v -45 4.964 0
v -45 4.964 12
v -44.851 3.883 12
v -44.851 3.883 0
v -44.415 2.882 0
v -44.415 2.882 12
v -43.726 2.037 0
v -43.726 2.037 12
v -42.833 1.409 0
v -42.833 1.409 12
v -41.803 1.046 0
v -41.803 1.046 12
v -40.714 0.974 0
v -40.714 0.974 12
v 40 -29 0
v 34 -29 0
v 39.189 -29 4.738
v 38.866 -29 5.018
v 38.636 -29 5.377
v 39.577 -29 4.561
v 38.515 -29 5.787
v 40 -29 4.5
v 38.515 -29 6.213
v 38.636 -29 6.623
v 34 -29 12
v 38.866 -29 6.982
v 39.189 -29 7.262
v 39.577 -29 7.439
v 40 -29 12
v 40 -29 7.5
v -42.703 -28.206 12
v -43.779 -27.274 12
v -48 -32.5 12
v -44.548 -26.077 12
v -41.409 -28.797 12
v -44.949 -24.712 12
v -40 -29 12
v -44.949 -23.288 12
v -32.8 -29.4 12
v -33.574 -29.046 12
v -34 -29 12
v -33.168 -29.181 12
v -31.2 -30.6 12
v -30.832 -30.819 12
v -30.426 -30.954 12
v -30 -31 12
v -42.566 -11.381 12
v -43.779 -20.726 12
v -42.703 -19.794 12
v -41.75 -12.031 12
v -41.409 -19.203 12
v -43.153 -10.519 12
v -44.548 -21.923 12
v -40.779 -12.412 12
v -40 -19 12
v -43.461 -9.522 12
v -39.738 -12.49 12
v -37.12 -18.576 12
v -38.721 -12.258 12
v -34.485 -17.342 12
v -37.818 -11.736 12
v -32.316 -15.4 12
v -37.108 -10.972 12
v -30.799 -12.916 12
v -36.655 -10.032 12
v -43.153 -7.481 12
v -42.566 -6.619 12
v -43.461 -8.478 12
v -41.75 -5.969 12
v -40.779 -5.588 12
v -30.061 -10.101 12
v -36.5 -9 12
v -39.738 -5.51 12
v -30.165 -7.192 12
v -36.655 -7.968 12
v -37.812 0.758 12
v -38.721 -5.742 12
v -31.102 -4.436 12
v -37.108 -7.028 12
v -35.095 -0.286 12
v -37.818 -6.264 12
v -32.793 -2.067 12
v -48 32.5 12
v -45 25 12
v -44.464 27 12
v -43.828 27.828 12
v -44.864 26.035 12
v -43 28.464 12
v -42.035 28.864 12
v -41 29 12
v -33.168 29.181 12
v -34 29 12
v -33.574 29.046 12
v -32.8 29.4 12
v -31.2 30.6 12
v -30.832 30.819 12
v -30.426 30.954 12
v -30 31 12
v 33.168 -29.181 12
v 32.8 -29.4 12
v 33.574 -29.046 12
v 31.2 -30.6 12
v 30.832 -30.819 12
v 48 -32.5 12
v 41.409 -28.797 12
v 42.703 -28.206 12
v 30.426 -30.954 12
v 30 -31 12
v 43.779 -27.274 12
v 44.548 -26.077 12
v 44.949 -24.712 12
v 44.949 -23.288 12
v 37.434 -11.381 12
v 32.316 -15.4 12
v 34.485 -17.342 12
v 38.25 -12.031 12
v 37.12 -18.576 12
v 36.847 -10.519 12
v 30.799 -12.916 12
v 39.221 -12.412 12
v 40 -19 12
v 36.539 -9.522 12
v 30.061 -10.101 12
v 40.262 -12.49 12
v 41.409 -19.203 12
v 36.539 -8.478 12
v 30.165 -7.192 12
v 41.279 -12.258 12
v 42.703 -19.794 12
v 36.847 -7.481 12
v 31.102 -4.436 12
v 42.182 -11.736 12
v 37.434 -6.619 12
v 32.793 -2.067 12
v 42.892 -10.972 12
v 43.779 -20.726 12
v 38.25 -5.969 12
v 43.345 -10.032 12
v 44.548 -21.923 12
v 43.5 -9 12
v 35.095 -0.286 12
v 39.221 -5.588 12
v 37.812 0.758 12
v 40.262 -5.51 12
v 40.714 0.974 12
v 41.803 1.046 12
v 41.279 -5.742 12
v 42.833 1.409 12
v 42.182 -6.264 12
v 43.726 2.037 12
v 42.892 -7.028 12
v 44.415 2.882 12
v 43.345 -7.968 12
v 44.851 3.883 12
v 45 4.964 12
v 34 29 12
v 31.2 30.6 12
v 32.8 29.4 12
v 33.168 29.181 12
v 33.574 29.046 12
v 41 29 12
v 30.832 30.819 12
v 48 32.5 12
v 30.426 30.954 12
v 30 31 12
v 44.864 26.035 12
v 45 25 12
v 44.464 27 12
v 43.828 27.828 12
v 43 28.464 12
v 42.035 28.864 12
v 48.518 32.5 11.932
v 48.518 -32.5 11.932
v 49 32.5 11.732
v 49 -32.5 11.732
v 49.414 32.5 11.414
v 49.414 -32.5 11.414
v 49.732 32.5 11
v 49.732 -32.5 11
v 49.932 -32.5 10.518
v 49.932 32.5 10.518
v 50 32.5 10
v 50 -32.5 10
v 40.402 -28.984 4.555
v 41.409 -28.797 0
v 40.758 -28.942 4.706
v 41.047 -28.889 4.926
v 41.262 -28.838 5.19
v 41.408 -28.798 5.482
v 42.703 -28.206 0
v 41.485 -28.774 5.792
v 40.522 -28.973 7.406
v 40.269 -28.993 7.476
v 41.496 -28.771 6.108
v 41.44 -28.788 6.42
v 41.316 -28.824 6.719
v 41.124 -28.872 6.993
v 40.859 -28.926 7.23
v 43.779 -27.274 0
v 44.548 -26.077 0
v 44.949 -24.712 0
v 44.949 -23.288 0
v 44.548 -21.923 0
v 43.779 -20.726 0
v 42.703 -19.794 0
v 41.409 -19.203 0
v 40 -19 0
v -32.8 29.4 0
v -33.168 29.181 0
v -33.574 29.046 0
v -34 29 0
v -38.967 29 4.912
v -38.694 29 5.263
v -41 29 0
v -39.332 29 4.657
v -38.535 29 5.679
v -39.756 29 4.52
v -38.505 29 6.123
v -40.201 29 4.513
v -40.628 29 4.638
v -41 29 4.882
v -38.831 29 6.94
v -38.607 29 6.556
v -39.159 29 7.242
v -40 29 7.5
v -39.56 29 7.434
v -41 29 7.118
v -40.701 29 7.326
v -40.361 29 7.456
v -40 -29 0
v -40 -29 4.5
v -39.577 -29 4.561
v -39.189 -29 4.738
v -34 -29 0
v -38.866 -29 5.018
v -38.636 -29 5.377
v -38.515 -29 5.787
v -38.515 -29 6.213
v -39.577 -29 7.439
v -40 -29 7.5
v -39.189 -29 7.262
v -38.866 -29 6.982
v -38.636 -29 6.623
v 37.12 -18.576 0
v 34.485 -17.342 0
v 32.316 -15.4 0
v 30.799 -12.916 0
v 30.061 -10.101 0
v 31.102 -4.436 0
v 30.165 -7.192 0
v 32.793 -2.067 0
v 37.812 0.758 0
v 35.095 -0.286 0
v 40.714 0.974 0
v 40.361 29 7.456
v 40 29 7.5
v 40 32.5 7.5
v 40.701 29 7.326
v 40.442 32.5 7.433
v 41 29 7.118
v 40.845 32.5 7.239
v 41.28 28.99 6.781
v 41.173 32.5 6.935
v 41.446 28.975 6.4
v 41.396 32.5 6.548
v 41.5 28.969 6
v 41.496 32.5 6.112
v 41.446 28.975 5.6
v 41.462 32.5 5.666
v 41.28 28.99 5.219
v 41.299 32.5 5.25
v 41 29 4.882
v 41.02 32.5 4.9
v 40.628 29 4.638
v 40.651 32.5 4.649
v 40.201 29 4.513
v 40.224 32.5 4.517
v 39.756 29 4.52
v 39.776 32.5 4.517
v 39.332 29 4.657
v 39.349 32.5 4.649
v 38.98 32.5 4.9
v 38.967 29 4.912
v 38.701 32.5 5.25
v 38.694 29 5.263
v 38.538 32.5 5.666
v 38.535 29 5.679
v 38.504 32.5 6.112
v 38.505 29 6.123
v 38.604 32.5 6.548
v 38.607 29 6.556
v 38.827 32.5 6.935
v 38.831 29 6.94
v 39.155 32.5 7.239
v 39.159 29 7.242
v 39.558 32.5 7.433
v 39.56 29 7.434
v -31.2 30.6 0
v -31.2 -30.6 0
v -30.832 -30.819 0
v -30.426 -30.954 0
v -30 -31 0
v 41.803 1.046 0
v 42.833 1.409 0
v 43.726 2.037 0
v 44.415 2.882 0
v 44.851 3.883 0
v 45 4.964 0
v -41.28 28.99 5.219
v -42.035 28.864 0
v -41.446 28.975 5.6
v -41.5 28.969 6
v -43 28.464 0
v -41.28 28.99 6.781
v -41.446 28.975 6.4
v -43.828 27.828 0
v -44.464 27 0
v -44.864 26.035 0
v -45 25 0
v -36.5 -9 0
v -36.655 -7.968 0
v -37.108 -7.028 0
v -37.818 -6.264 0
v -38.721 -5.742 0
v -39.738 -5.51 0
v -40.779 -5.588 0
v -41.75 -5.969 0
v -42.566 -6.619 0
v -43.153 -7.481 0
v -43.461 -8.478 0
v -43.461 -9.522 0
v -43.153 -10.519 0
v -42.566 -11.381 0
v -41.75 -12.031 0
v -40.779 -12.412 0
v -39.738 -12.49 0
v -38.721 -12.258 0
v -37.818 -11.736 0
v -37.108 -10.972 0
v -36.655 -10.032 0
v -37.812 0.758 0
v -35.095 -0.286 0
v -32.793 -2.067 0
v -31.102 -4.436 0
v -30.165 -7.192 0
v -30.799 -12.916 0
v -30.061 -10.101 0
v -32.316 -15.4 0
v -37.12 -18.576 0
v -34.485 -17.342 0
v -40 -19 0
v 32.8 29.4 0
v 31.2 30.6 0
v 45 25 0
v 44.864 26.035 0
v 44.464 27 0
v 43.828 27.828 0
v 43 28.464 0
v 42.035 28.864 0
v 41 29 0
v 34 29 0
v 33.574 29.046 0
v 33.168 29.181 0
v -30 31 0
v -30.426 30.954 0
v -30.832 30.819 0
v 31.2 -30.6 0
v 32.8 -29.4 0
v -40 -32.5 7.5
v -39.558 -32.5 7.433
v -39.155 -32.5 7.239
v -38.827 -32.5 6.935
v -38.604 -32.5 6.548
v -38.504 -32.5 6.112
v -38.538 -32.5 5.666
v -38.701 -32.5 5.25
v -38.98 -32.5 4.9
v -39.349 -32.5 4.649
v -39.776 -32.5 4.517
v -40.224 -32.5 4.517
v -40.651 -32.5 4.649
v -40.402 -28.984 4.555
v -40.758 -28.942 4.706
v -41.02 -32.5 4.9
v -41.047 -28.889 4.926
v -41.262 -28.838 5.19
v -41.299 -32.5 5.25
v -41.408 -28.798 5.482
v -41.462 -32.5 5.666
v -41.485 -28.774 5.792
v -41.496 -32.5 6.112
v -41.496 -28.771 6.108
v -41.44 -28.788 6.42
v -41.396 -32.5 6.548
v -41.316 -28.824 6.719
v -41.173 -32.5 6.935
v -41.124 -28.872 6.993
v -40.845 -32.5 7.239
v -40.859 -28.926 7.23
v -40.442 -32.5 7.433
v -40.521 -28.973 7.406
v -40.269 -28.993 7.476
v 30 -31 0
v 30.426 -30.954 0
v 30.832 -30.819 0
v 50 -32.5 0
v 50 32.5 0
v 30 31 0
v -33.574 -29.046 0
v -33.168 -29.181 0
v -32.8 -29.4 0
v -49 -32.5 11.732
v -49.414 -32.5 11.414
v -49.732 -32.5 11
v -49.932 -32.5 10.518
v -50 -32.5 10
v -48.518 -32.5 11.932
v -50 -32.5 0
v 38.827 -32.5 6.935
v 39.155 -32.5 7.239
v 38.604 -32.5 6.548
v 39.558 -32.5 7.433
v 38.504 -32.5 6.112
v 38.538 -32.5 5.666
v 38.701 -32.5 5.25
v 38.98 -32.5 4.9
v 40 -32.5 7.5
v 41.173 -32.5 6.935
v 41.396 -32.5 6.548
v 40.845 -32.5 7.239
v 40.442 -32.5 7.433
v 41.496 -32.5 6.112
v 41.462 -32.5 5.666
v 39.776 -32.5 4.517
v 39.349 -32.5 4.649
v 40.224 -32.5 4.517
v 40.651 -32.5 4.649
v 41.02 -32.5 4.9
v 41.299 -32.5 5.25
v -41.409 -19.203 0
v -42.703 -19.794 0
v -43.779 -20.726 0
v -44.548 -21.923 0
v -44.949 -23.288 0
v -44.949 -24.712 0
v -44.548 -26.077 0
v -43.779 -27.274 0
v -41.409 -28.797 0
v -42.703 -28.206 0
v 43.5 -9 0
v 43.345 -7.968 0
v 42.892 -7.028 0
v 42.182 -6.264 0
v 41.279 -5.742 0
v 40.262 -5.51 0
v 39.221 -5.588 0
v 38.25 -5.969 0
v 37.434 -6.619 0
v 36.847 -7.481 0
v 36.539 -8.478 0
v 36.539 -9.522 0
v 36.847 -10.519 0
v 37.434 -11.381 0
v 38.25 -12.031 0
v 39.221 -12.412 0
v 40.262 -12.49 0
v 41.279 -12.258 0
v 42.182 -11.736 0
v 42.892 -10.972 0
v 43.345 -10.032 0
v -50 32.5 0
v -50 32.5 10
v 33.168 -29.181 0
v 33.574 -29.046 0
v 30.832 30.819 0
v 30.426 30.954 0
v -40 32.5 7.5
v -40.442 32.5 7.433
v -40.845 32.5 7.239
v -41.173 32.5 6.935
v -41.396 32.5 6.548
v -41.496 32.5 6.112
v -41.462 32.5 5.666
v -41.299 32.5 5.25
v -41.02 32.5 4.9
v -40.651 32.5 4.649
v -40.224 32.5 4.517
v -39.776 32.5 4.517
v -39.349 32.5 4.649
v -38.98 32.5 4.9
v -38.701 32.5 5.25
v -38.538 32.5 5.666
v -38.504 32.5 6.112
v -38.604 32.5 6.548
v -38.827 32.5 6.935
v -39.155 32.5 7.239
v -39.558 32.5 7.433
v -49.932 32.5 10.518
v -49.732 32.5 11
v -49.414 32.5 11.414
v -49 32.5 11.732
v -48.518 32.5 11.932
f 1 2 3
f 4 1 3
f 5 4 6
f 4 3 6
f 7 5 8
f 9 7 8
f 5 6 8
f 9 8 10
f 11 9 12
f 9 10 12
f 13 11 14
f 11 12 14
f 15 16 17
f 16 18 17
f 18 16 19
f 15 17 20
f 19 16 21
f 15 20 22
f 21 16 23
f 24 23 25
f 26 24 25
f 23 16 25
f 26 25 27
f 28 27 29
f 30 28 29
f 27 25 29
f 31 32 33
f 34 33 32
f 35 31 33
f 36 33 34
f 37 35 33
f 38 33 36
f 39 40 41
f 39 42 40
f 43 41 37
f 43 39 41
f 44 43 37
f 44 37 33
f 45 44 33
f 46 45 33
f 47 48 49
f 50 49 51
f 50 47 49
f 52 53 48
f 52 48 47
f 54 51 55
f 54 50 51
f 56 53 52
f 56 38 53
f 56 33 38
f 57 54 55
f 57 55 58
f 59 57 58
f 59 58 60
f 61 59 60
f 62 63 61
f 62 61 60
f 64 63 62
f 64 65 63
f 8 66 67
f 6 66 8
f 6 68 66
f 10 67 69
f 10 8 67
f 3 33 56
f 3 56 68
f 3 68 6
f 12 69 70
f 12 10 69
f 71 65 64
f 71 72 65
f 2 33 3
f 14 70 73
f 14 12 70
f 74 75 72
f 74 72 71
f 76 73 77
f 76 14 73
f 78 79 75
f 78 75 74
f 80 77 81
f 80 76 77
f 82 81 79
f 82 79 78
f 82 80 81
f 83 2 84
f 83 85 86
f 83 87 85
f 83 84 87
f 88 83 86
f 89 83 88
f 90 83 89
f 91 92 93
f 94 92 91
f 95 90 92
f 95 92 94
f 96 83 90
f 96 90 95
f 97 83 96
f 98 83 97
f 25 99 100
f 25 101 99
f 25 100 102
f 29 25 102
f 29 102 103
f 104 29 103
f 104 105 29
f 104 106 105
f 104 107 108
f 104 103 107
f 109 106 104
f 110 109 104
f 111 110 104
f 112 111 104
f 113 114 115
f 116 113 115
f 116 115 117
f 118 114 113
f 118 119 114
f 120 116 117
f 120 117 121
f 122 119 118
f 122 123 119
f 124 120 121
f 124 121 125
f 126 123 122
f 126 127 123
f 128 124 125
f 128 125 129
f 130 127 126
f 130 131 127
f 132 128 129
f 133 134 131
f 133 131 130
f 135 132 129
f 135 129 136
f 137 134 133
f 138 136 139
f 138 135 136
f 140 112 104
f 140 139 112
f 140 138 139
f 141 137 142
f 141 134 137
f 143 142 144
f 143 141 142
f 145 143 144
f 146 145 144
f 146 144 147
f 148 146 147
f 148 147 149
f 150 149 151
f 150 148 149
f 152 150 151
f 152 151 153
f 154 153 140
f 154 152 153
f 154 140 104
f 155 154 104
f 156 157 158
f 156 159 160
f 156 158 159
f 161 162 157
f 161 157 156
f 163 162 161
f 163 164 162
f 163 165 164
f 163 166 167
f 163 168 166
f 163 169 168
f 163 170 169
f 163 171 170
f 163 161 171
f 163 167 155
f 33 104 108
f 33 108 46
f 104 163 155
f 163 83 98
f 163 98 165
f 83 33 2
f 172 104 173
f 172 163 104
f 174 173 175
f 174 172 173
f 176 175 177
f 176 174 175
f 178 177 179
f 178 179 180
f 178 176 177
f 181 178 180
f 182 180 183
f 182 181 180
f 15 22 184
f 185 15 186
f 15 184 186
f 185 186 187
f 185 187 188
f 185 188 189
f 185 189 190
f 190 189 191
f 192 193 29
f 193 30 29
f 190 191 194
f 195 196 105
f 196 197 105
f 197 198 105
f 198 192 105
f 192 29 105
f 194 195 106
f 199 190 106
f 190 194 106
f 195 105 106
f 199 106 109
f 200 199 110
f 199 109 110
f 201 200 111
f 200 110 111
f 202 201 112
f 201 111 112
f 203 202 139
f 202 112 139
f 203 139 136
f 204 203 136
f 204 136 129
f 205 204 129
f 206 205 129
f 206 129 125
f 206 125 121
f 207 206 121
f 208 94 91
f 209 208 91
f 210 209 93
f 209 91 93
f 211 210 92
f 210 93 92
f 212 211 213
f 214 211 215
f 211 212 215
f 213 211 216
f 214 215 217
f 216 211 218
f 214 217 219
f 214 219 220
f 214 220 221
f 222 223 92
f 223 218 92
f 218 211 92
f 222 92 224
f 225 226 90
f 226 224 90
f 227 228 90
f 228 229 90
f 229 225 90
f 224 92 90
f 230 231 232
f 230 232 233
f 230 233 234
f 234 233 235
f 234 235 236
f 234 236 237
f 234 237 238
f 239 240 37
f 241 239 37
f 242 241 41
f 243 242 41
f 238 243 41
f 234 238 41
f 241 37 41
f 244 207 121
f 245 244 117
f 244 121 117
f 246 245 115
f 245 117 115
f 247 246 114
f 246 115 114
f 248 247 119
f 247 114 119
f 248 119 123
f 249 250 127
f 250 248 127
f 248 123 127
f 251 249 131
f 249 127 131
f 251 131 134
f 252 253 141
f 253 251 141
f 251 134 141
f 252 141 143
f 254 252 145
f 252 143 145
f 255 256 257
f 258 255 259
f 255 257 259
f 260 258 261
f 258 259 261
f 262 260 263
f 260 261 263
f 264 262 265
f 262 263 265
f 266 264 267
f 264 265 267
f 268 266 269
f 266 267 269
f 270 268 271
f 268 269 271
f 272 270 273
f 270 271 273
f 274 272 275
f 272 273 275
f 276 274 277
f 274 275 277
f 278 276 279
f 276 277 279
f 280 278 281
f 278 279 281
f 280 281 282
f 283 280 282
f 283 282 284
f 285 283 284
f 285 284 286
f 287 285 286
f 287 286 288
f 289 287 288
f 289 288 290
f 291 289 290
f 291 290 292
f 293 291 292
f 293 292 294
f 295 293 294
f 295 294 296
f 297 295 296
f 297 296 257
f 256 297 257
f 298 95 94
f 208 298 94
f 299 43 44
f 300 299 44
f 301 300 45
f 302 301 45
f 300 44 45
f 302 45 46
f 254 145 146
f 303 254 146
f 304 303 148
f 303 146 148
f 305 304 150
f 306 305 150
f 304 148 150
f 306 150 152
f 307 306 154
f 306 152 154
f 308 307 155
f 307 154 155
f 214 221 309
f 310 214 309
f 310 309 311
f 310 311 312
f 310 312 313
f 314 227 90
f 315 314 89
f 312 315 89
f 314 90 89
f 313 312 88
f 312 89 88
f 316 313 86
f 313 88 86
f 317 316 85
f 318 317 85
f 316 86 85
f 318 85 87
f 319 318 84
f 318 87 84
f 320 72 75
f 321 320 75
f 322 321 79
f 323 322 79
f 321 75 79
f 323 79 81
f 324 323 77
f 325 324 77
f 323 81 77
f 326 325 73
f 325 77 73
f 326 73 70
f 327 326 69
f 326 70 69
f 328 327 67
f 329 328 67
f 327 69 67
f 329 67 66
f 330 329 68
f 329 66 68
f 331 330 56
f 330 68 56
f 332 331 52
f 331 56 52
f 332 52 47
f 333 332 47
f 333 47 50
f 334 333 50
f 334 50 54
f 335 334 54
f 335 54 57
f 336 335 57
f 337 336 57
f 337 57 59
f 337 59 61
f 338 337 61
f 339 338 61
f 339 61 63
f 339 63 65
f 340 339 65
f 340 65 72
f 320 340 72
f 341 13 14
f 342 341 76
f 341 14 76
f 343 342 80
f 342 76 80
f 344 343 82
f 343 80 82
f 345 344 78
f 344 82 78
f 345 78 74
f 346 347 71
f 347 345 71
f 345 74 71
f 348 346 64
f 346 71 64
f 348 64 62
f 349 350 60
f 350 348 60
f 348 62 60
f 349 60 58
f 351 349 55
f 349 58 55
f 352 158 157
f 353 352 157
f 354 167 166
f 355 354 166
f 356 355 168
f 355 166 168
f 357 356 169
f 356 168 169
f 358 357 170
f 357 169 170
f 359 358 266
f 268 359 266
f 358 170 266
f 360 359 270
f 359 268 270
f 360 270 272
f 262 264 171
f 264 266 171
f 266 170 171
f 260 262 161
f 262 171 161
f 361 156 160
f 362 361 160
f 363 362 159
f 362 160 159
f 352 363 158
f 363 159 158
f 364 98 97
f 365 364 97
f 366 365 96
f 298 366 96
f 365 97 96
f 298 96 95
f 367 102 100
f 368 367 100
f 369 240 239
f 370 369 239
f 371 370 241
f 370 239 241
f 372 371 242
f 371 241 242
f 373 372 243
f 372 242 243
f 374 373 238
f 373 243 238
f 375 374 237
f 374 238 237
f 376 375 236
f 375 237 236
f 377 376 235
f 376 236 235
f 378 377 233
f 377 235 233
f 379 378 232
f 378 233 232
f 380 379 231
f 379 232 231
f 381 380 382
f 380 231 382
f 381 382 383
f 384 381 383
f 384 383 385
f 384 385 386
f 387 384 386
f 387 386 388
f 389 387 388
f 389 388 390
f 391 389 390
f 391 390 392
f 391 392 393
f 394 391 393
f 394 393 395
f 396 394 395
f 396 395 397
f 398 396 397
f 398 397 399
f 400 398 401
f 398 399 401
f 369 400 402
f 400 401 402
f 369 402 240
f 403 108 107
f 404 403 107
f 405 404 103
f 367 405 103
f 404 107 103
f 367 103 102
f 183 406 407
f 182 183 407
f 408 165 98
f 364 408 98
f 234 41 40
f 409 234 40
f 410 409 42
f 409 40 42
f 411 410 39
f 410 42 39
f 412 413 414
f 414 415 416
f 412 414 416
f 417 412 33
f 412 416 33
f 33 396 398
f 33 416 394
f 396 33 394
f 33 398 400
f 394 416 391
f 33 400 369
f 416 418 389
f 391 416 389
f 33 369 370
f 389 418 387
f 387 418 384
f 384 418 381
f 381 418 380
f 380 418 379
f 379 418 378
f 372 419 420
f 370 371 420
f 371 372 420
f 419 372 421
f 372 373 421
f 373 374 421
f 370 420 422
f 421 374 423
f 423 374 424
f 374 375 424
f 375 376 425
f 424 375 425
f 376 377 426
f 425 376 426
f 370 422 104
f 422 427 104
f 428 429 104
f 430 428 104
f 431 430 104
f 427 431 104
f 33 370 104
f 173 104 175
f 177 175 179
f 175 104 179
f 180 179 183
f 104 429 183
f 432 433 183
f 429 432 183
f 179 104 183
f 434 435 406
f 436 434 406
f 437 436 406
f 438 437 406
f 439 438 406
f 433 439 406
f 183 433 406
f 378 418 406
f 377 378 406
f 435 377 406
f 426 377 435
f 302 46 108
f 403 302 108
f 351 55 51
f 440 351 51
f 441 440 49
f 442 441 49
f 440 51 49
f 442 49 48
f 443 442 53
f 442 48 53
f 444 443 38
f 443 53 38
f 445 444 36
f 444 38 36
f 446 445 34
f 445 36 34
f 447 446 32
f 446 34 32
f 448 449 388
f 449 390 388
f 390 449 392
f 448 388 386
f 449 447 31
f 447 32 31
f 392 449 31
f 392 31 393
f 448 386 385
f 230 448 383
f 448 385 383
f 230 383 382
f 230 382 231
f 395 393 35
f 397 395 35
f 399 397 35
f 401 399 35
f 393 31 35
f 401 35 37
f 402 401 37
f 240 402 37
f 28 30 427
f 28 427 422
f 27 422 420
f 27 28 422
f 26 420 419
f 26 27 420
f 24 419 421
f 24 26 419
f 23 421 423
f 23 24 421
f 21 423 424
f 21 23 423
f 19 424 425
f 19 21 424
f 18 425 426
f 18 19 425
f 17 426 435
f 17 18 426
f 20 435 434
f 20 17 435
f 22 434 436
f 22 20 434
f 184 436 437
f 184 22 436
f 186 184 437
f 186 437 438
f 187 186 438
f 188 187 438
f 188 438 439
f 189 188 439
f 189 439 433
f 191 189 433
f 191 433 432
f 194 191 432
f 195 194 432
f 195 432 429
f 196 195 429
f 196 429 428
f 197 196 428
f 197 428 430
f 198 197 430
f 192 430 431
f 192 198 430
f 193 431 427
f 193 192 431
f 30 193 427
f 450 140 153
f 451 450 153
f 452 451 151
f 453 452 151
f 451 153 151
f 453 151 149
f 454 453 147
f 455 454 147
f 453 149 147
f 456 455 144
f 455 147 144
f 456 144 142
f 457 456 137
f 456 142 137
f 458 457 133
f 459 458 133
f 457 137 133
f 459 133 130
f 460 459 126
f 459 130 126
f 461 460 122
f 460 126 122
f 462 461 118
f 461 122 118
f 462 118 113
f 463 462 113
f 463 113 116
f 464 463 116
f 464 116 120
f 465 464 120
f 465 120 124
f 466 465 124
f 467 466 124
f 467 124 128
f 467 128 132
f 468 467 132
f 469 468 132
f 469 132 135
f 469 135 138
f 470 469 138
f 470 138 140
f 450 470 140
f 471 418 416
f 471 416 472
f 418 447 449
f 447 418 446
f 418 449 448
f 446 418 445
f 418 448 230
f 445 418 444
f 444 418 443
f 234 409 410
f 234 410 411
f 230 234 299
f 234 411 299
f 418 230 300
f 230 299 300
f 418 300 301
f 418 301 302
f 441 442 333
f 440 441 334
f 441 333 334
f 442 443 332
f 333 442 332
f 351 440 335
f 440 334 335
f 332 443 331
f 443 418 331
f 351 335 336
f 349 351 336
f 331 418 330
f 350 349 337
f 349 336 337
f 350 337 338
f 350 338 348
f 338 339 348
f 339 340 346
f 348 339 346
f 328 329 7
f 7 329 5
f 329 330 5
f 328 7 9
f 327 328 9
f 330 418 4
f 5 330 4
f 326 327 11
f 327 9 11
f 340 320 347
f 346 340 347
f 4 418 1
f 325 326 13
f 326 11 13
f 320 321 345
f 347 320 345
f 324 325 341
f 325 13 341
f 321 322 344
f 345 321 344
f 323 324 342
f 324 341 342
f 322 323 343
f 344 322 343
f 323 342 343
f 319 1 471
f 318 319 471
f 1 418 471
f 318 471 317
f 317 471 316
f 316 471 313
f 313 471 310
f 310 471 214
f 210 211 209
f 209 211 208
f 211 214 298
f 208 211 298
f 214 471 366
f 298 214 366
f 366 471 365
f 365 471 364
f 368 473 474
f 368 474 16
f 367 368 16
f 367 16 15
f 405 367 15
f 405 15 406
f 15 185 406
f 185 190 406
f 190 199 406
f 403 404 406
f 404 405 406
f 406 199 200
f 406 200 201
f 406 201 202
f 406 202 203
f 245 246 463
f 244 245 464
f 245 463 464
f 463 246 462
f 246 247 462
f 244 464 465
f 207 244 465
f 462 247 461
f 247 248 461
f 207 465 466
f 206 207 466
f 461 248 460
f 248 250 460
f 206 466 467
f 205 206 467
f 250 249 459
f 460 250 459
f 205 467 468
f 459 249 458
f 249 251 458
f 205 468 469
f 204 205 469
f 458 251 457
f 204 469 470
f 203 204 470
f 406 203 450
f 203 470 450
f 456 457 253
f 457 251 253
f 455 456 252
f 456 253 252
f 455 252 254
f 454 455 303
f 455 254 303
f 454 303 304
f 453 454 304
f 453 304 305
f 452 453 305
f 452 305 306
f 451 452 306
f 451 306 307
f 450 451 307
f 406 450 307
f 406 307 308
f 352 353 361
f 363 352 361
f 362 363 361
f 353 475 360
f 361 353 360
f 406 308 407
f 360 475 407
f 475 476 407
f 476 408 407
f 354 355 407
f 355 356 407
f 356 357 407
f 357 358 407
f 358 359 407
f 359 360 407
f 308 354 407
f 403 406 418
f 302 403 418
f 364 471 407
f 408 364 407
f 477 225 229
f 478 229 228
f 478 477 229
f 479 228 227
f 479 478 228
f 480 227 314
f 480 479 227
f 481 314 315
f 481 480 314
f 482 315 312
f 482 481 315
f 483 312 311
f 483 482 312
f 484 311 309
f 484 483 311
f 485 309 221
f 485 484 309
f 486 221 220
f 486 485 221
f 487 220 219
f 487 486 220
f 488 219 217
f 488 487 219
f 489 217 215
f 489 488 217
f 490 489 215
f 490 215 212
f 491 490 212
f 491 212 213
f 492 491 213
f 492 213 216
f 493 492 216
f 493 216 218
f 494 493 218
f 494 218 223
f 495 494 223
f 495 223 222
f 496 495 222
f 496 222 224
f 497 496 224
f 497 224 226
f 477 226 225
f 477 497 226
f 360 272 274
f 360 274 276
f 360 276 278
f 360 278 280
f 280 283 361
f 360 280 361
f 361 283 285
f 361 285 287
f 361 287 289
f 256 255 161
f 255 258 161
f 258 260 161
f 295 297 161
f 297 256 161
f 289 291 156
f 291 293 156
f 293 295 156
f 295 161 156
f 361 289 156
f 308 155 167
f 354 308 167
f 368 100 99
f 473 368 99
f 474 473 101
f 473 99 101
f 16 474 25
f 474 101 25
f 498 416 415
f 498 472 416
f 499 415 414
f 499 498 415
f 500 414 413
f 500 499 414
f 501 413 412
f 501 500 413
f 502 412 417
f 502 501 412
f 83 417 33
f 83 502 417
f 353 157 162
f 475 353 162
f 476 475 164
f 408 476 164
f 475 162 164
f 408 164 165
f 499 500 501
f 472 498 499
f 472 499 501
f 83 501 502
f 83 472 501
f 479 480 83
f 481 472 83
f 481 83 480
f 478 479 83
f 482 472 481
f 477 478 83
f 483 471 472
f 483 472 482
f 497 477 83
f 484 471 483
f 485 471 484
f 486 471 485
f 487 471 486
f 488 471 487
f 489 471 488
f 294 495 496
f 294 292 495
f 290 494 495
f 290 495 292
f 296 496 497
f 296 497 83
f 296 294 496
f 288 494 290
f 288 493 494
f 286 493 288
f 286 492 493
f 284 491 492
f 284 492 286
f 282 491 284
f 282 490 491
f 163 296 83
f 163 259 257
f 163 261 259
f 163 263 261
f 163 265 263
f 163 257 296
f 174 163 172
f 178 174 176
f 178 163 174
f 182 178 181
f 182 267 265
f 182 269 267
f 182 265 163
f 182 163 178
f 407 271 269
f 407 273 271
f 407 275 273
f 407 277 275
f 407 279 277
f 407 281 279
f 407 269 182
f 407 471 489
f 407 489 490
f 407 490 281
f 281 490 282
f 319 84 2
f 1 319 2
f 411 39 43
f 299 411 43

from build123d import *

# Parameters (mm, degrees)
SKETCH_1_W          = 100
SKETCH_1_H          = 65
EXTRUDE_1_DEPTH     = 12
SKETCH_2_R          = 3.5
CUT_EXTRUDE_1_DEPTH = 61.829680256
SKETCH_3_R          = 1.5
CUT_EXTRUDE_2_DEPTH = 10
CUT_EXTRUDE_START   = -10
SKETCH_4_R          = 1.5
CUT_EXTRUDE_3_DEPTH = 10
FILLET_1_R          = 2


with BuildPart() as part:
    # 草图1 → 凸台-拉伸1 (new body)
    with BuildSketch(Plane.XY):
        Rectangle(SKETCH_1_W, SKETCH_1_H)
    extrude(amount=EXTRUDE_1_DEPTH)

    # 草图2 → 切除-拉伸1 (cut, through all)
    with BuildSketch(Plane.XY.offset(12)):
        with Locations((-40, -9)):
            Circle(SKETCH_2_R)
        with Locations((40, -9)):
            Circle(SKETCH_2_R)
        with BuildLine():
            Line((30, 31), (-30, 31))
            ThreePointArc((-30, 31), (-30.632455532, 30.897366596), (-31.2, 30.6))
            Line((-31.2, 30.6), (-32.8, 29.4))
            ThreePointArc((-32.8, 29.4), (-33.367544468, 29.102633404), (-34, 29))
            Line((-34, 29), (-41, 29))
            ThreePointArc((-41, 29), (-43.828427125, 27.828427125), (-45, 25))
            Line((-45, 25), (-45, 4.964240044))
            ThreePointArc((-45, 4.964240044), (-43.725540575, 2.036539825), (-40.714285714, 0.974457174))
            ThreePointArc((-40.714285714, 0.974457174), (-30.006387747, -8.642628863), (-40, -19))
            ThreePointArc((-40, -19), (-45, -24), (-40, -29))
            Line((-40, -29), (-34, -29))
            ThreePointArc((-34, -29), (-33.367544468, -29.102633404), (-32.8, -29.4))
            Line((-32.8, -29.4), (-31.2, -30.6))
            ThreePointArc((-31.2, -30.6), (-30.632455532, -30.897366596), (-30, -31))
            Line((-30, -31), (30, -31))
            ThreePointArc((30, -31), (30.632455532, -30.897366596), (31.2, -30.6))
            Line((31.2, -30.6), (32.8, -29.4))
            ThreePointArc((32.8, -29.4), (33.367544468, -29.102633404), (34, -29))
            Line((34, -29), (40, -29))
            ThreePointArc((40, -29), (45, -24), (40, -19))
            ThreePointArc((40, -19), (30.006387747, -8.642628863), (40.714285714, 0.974457174))
            ThreePointArc((40.714285714, 0.974457174), (43.725540575, 2.036539825), (45, 4.964240044))
            Line((45, 4.964240044), (45, 25))
            ThreePointArc((45, 25), (43.828427125, 27.828427125), (41, 29))
            Line((41, 29), (34, 29))
            ThreePointArc((34, 29), (33.367544468, 29.102633404), (32.8, 29.4))
            Line((32.8, 29.4), (31.2, 30.6))
            ThreePointArc((31.2, 30.6), (30.632455532, 30.897366596), (30, 31))
        make_face()
    extrude(amount=-CUT_EXTRUDE_1_DEPTH, mode=Mode.SUBTRACT)

    # 草图3 → 切除-拉伸2 (cut)
    with BuildSketch(Plane(origin=(0, 32.5, 0), x_dir=(1, 0, 0), z_dir=(0, 1, 0))):
        with Locations(Location((40, -6, 0), (0, 0, 270))):
            Circle(SKETCH_3_R)
    cut_extrude_2 = extrude(amount=-CUT_EXTRUDE_2_DEPTH, mode=Mode.SUBTRACT)

    # 草图4 → 切除-拉伸3 (cut)
    with BuildSketch(Plane.XZ.offset(32.5).offset(CUT_EXTRUDE_START)):
        with Locations(Location((40, 6, 0), (0, 0, 90))):
            Circle(SKETCH_4_R)
    cut_extrude_3 = extrude(amount=CUT_EXTRUDE_3_DEPTH, mode=Mode.SUBTRACT)

    # 镜向1: 切除-拉伸2, 切除-拉伸3 across plane
    add(cut_extrude_2.mirror(Plane(origin=(0, 0, 0), x_dir=(0, 0, 1), z_dir=(1, 0, 0))), mode=Mode.SUBTRACT)
    add(cut_extrude_3.mirror(Plane(origin=(0, 0, 0), x_dir=(0, 0, 1), z_dir=(1, 0, 0))), mode=Mode.SUBTRACT)

    # 圆角1
    fillet_1_edges = [part.edges().sort_by_distance(p)[0] for p in [
        (-50, 0, 12),
        (50, 0, 12),
    ]]
    fillet(fillet_1_edges, radius=FILLET_1_R)


solid = part.part
